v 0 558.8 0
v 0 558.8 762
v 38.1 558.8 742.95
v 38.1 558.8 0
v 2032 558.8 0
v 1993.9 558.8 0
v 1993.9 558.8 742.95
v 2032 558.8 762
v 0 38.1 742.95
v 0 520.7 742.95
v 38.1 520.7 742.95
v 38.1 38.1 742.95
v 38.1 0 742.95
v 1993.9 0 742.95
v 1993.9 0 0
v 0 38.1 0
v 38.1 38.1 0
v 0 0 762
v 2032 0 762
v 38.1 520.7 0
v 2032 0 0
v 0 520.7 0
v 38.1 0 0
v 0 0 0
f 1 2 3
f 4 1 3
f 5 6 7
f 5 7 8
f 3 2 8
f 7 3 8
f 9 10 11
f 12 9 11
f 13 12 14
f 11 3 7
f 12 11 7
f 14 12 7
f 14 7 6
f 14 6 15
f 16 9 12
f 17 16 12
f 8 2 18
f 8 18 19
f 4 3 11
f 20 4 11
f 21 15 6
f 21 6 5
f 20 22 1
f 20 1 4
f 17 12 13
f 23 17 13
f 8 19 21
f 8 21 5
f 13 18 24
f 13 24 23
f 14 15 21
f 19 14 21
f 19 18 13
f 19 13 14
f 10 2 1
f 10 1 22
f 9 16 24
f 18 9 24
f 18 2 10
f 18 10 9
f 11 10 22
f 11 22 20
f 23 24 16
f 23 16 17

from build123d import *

# Parameters (mm, degrees)
F1_W     = 2032
F1_H     = 558.8
F2_DEPTH = 19.05
F3_W     = 38.1
F3_H     = 38.1
F3_H_2   = 558.8
F4_DEPTH = 742.95


with BuildPart() as f2:
    # F1 (on offset) → F2 (new body)
    with BuildSketch(Plane.XY.offset(762)):
        with Locations((1016, 279.4)):
            Rectangle(F1_W, F1_H)
    extrude(amount=-F2_DEPTH)

    # F3 (on face) → F4 (join, through all)
    with BuildSketch(Plane(origin=(0, 0, 742.95), x_dir=(1, 0, 0), z_dir=(0, 0, -1))):
        with Locations((19.05, -19.05)):
            Rectangle(F3_W, F3_H)
        with Locations((19.05, -539.75)):
            Rectangle(F3_W, F3_H)
        with Locations((2012.95, -279.4)):
            Rectangle(F3_W, F3_H_2)
    extrude(amount=F4_DEPTH)


solid = f2.part
